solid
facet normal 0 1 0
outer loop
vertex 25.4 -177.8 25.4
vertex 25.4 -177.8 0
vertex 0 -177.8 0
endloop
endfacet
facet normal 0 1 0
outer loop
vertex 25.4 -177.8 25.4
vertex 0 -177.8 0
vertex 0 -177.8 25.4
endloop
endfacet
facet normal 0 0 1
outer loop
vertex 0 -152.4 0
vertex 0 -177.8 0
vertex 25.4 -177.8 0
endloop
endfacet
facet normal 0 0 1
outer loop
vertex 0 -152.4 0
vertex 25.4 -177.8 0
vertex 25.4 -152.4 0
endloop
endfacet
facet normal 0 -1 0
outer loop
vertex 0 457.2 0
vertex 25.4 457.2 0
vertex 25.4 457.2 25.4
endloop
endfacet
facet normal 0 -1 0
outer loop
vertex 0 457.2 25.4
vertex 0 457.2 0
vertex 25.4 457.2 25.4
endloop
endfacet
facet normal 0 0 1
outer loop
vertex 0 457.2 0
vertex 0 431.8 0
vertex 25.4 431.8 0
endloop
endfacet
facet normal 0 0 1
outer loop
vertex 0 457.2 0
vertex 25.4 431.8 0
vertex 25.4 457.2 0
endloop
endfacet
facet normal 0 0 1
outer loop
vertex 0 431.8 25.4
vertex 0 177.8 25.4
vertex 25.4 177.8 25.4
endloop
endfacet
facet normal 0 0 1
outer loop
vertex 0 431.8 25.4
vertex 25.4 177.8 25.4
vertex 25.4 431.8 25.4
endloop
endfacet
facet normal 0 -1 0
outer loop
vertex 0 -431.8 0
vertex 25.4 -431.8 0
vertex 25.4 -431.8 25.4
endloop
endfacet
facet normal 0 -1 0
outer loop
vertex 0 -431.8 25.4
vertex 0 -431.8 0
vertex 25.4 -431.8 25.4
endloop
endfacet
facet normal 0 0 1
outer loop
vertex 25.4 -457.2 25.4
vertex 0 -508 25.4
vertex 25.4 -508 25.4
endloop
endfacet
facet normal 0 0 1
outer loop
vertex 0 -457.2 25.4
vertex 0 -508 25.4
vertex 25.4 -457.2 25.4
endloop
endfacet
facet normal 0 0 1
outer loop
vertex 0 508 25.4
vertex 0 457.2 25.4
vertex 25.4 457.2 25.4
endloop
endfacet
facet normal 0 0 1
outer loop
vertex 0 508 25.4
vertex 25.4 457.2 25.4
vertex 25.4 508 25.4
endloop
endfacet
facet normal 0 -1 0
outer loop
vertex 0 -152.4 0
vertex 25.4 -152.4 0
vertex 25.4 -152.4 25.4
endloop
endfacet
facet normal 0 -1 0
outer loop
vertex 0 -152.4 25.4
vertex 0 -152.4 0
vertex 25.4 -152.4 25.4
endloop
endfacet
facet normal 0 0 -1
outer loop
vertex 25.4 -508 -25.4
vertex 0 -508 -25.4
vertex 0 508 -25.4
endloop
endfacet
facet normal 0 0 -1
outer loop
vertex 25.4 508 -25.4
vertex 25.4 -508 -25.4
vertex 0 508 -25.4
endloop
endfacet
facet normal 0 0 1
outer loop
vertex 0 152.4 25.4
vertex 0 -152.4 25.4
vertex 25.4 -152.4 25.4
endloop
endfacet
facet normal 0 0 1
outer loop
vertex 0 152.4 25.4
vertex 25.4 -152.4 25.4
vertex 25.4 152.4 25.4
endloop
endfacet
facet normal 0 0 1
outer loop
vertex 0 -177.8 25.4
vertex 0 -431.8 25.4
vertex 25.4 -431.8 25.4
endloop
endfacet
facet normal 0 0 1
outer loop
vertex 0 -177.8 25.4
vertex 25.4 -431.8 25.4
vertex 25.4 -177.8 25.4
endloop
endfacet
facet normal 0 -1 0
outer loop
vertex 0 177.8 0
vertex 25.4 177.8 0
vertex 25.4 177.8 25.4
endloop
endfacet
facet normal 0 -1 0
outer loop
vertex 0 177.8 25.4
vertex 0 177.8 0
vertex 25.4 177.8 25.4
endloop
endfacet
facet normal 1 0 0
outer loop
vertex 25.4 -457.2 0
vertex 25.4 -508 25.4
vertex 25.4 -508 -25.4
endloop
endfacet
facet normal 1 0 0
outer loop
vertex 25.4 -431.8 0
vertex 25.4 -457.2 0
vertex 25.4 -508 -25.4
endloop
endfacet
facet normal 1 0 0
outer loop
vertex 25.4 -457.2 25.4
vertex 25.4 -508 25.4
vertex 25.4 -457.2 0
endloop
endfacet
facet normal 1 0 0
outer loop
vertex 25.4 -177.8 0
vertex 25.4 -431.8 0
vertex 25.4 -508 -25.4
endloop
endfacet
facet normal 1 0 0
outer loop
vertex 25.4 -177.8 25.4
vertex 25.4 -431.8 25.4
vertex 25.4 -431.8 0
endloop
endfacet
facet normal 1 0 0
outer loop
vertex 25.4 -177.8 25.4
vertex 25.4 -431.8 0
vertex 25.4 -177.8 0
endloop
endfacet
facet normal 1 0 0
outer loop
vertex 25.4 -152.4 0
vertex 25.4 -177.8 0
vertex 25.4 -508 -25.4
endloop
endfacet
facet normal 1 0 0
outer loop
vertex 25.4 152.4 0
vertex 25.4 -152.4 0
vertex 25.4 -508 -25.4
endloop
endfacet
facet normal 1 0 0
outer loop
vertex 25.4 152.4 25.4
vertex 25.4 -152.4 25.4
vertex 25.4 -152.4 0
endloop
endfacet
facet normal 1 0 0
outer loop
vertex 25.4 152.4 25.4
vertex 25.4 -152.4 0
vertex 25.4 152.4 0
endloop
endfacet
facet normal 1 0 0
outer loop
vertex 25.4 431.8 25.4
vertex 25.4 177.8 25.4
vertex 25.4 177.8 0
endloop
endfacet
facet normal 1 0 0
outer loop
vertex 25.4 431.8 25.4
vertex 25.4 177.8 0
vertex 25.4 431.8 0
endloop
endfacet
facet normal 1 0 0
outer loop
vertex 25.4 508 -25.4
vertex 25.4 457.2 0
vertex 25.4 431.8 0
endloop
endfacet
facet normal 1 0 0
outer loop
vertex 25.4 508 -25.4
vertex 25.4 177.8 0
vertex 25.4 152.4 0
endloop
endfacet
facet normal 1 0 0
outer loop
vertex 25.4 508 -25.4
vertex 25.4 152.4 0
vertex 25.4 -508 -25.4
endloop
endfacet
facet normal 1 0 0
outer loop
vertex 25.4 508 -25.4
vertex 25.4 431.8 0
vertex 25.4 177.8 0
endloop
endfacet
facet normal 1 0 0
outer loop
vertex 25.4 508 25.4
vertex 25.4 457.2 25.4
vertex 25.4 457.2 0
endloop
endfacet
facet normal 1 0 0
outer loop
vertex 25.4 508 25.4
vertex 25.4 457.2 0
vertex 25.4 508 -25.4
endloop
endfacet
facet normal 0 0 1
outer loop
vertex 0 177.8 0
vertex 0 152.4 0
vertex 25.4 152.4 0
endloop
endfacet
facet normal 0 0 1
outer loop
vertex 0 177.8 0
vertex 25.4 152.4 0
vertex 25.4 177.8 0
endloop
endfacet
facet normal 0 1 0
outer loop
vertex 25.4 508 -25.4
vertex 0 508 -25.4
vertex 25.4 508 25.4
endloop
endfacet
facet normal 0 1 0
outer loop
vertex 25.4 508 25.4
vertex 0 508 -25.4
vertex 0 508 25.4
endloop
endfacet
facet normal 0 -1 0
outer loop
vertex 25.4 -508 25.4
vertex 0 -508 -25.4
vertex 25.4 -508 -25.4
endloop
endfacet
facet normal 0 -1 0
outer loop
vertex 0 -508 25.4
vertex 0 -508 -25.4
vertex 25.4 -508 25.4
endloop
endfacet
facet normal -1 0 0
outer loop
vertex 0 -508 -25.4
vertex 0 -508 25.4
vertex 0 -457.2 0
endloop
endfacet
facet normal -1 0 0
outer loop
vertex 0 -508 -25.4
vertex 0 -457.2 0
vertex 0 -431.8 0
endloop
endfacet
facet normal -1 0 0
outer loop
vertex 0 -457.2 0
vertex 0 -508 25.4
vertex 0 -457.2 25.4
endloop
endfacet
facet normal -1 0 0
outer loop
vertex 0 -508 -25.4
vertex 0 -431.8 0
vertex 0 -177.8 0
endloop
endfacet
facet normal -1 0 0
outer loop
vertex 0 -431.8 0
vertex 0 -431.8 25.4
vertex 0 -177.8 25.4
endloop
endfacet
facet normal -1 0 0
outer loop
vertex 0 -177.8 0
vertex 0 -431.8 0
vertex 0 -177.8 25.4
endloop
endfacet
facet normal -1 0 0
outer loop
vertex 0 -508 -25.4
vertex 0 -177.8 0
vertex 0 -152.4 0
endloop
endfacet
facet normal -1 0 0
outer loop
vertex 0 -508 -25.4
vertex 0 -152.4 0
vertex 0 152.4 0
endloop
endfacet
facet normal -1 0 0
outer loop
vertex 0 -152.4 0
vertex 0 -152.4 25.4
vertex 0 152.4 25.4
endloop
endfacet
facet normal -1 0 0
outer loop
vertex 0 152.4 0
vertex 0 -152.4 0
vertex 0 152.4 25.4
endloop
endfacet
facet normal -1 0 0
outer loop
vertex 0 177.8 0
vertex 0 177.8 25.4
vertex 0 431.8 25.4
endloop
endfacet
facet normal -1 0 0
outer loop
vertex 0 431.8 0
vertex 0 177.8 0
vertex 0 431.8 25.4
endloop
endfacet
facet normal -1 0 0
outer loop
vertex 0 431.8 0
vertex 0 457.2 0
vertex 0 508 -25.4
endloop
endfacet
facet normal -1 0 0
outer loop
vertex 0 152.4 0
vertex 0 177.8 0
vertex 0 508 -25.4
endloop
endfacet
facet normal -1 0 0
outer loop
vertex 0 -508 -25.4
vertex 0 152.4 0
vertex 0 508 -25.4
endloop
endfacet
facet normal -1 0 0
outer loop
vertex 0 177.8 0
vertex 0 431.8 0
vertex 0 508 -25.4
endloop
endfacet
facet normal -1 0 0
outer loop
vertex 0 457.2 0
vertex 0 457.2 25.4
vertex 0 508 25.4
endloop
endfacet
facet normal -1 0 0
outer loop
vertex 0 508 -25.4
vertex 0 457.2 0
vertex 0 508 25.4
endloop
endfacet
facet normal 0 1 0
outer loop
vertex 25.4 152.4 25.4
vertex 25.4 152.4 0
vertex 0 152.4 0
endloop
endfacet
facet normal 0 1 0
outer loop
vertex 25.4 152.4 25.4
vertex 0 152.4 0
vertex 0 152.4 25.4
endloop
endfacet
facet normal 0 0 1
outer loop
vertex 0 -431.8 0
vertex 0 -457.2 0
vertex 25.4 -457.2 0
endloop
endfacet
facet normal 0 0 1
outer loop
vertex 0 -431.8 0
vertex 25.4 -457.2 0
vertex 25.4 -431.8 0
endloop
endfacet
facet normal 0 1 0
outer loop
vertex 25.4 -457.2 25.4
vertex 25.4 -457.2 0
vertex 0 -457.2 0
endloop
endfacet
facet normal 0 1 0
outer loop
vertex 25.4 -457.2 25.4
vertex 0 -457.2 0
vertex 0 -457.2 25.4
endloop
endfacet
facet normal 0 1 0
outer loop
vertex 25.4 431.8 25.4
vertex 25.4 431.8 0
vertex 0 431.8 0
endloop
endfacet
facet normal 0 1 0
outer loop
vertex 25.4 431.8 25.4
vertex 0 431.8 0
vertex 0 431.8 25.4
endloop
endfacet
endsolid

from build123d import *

# Parameters (mm, degrees)
F0_W     = 1016
F0_H     = 50.8
F1_DEPTH = 25.4
F2_W     = 25.4
F2_H     = 25.4
F3_DEPTH = 25.4
F4_W     = 25.4
F4_H     = 25.4
F5_DEPTH = 25.4


with BuildPart() as f1:
    # F0 (on Right) → F1 (new body)
    with BuildSketch(Plane.YZ):
        Rectangle(F0_W, F0_H)
    extrude(amount=F1_DEPTH)

    # F2 (on face) → F3 (cut)
    with BuildSketch(Plane.YZ.offset(25.4)):
        with Locations((-165.1, 12.7)):
            Rectangle(F2_W, F2_H)
        with Locations((165.1, 12.7)):
            Rectangle(F2_W, F2_H)
    extrude(amount=-F3_DEPTH, mode=Mode.SUBTRACT)

    # F4 (on face) → F5 (cut)
    with BuildSketch(Plane.YZ.offset(25.4)):
        with Locations((-444.5, 12.7)):
            Rectangle(F4_W, F4_H)
        with Locations((444.5, 12.7)):
            Rectangle(F4_W, F4_H)
    extrude(amount=-F5_DEPTH, mode=Mode.SUBTRACT)


solid = f1.part
